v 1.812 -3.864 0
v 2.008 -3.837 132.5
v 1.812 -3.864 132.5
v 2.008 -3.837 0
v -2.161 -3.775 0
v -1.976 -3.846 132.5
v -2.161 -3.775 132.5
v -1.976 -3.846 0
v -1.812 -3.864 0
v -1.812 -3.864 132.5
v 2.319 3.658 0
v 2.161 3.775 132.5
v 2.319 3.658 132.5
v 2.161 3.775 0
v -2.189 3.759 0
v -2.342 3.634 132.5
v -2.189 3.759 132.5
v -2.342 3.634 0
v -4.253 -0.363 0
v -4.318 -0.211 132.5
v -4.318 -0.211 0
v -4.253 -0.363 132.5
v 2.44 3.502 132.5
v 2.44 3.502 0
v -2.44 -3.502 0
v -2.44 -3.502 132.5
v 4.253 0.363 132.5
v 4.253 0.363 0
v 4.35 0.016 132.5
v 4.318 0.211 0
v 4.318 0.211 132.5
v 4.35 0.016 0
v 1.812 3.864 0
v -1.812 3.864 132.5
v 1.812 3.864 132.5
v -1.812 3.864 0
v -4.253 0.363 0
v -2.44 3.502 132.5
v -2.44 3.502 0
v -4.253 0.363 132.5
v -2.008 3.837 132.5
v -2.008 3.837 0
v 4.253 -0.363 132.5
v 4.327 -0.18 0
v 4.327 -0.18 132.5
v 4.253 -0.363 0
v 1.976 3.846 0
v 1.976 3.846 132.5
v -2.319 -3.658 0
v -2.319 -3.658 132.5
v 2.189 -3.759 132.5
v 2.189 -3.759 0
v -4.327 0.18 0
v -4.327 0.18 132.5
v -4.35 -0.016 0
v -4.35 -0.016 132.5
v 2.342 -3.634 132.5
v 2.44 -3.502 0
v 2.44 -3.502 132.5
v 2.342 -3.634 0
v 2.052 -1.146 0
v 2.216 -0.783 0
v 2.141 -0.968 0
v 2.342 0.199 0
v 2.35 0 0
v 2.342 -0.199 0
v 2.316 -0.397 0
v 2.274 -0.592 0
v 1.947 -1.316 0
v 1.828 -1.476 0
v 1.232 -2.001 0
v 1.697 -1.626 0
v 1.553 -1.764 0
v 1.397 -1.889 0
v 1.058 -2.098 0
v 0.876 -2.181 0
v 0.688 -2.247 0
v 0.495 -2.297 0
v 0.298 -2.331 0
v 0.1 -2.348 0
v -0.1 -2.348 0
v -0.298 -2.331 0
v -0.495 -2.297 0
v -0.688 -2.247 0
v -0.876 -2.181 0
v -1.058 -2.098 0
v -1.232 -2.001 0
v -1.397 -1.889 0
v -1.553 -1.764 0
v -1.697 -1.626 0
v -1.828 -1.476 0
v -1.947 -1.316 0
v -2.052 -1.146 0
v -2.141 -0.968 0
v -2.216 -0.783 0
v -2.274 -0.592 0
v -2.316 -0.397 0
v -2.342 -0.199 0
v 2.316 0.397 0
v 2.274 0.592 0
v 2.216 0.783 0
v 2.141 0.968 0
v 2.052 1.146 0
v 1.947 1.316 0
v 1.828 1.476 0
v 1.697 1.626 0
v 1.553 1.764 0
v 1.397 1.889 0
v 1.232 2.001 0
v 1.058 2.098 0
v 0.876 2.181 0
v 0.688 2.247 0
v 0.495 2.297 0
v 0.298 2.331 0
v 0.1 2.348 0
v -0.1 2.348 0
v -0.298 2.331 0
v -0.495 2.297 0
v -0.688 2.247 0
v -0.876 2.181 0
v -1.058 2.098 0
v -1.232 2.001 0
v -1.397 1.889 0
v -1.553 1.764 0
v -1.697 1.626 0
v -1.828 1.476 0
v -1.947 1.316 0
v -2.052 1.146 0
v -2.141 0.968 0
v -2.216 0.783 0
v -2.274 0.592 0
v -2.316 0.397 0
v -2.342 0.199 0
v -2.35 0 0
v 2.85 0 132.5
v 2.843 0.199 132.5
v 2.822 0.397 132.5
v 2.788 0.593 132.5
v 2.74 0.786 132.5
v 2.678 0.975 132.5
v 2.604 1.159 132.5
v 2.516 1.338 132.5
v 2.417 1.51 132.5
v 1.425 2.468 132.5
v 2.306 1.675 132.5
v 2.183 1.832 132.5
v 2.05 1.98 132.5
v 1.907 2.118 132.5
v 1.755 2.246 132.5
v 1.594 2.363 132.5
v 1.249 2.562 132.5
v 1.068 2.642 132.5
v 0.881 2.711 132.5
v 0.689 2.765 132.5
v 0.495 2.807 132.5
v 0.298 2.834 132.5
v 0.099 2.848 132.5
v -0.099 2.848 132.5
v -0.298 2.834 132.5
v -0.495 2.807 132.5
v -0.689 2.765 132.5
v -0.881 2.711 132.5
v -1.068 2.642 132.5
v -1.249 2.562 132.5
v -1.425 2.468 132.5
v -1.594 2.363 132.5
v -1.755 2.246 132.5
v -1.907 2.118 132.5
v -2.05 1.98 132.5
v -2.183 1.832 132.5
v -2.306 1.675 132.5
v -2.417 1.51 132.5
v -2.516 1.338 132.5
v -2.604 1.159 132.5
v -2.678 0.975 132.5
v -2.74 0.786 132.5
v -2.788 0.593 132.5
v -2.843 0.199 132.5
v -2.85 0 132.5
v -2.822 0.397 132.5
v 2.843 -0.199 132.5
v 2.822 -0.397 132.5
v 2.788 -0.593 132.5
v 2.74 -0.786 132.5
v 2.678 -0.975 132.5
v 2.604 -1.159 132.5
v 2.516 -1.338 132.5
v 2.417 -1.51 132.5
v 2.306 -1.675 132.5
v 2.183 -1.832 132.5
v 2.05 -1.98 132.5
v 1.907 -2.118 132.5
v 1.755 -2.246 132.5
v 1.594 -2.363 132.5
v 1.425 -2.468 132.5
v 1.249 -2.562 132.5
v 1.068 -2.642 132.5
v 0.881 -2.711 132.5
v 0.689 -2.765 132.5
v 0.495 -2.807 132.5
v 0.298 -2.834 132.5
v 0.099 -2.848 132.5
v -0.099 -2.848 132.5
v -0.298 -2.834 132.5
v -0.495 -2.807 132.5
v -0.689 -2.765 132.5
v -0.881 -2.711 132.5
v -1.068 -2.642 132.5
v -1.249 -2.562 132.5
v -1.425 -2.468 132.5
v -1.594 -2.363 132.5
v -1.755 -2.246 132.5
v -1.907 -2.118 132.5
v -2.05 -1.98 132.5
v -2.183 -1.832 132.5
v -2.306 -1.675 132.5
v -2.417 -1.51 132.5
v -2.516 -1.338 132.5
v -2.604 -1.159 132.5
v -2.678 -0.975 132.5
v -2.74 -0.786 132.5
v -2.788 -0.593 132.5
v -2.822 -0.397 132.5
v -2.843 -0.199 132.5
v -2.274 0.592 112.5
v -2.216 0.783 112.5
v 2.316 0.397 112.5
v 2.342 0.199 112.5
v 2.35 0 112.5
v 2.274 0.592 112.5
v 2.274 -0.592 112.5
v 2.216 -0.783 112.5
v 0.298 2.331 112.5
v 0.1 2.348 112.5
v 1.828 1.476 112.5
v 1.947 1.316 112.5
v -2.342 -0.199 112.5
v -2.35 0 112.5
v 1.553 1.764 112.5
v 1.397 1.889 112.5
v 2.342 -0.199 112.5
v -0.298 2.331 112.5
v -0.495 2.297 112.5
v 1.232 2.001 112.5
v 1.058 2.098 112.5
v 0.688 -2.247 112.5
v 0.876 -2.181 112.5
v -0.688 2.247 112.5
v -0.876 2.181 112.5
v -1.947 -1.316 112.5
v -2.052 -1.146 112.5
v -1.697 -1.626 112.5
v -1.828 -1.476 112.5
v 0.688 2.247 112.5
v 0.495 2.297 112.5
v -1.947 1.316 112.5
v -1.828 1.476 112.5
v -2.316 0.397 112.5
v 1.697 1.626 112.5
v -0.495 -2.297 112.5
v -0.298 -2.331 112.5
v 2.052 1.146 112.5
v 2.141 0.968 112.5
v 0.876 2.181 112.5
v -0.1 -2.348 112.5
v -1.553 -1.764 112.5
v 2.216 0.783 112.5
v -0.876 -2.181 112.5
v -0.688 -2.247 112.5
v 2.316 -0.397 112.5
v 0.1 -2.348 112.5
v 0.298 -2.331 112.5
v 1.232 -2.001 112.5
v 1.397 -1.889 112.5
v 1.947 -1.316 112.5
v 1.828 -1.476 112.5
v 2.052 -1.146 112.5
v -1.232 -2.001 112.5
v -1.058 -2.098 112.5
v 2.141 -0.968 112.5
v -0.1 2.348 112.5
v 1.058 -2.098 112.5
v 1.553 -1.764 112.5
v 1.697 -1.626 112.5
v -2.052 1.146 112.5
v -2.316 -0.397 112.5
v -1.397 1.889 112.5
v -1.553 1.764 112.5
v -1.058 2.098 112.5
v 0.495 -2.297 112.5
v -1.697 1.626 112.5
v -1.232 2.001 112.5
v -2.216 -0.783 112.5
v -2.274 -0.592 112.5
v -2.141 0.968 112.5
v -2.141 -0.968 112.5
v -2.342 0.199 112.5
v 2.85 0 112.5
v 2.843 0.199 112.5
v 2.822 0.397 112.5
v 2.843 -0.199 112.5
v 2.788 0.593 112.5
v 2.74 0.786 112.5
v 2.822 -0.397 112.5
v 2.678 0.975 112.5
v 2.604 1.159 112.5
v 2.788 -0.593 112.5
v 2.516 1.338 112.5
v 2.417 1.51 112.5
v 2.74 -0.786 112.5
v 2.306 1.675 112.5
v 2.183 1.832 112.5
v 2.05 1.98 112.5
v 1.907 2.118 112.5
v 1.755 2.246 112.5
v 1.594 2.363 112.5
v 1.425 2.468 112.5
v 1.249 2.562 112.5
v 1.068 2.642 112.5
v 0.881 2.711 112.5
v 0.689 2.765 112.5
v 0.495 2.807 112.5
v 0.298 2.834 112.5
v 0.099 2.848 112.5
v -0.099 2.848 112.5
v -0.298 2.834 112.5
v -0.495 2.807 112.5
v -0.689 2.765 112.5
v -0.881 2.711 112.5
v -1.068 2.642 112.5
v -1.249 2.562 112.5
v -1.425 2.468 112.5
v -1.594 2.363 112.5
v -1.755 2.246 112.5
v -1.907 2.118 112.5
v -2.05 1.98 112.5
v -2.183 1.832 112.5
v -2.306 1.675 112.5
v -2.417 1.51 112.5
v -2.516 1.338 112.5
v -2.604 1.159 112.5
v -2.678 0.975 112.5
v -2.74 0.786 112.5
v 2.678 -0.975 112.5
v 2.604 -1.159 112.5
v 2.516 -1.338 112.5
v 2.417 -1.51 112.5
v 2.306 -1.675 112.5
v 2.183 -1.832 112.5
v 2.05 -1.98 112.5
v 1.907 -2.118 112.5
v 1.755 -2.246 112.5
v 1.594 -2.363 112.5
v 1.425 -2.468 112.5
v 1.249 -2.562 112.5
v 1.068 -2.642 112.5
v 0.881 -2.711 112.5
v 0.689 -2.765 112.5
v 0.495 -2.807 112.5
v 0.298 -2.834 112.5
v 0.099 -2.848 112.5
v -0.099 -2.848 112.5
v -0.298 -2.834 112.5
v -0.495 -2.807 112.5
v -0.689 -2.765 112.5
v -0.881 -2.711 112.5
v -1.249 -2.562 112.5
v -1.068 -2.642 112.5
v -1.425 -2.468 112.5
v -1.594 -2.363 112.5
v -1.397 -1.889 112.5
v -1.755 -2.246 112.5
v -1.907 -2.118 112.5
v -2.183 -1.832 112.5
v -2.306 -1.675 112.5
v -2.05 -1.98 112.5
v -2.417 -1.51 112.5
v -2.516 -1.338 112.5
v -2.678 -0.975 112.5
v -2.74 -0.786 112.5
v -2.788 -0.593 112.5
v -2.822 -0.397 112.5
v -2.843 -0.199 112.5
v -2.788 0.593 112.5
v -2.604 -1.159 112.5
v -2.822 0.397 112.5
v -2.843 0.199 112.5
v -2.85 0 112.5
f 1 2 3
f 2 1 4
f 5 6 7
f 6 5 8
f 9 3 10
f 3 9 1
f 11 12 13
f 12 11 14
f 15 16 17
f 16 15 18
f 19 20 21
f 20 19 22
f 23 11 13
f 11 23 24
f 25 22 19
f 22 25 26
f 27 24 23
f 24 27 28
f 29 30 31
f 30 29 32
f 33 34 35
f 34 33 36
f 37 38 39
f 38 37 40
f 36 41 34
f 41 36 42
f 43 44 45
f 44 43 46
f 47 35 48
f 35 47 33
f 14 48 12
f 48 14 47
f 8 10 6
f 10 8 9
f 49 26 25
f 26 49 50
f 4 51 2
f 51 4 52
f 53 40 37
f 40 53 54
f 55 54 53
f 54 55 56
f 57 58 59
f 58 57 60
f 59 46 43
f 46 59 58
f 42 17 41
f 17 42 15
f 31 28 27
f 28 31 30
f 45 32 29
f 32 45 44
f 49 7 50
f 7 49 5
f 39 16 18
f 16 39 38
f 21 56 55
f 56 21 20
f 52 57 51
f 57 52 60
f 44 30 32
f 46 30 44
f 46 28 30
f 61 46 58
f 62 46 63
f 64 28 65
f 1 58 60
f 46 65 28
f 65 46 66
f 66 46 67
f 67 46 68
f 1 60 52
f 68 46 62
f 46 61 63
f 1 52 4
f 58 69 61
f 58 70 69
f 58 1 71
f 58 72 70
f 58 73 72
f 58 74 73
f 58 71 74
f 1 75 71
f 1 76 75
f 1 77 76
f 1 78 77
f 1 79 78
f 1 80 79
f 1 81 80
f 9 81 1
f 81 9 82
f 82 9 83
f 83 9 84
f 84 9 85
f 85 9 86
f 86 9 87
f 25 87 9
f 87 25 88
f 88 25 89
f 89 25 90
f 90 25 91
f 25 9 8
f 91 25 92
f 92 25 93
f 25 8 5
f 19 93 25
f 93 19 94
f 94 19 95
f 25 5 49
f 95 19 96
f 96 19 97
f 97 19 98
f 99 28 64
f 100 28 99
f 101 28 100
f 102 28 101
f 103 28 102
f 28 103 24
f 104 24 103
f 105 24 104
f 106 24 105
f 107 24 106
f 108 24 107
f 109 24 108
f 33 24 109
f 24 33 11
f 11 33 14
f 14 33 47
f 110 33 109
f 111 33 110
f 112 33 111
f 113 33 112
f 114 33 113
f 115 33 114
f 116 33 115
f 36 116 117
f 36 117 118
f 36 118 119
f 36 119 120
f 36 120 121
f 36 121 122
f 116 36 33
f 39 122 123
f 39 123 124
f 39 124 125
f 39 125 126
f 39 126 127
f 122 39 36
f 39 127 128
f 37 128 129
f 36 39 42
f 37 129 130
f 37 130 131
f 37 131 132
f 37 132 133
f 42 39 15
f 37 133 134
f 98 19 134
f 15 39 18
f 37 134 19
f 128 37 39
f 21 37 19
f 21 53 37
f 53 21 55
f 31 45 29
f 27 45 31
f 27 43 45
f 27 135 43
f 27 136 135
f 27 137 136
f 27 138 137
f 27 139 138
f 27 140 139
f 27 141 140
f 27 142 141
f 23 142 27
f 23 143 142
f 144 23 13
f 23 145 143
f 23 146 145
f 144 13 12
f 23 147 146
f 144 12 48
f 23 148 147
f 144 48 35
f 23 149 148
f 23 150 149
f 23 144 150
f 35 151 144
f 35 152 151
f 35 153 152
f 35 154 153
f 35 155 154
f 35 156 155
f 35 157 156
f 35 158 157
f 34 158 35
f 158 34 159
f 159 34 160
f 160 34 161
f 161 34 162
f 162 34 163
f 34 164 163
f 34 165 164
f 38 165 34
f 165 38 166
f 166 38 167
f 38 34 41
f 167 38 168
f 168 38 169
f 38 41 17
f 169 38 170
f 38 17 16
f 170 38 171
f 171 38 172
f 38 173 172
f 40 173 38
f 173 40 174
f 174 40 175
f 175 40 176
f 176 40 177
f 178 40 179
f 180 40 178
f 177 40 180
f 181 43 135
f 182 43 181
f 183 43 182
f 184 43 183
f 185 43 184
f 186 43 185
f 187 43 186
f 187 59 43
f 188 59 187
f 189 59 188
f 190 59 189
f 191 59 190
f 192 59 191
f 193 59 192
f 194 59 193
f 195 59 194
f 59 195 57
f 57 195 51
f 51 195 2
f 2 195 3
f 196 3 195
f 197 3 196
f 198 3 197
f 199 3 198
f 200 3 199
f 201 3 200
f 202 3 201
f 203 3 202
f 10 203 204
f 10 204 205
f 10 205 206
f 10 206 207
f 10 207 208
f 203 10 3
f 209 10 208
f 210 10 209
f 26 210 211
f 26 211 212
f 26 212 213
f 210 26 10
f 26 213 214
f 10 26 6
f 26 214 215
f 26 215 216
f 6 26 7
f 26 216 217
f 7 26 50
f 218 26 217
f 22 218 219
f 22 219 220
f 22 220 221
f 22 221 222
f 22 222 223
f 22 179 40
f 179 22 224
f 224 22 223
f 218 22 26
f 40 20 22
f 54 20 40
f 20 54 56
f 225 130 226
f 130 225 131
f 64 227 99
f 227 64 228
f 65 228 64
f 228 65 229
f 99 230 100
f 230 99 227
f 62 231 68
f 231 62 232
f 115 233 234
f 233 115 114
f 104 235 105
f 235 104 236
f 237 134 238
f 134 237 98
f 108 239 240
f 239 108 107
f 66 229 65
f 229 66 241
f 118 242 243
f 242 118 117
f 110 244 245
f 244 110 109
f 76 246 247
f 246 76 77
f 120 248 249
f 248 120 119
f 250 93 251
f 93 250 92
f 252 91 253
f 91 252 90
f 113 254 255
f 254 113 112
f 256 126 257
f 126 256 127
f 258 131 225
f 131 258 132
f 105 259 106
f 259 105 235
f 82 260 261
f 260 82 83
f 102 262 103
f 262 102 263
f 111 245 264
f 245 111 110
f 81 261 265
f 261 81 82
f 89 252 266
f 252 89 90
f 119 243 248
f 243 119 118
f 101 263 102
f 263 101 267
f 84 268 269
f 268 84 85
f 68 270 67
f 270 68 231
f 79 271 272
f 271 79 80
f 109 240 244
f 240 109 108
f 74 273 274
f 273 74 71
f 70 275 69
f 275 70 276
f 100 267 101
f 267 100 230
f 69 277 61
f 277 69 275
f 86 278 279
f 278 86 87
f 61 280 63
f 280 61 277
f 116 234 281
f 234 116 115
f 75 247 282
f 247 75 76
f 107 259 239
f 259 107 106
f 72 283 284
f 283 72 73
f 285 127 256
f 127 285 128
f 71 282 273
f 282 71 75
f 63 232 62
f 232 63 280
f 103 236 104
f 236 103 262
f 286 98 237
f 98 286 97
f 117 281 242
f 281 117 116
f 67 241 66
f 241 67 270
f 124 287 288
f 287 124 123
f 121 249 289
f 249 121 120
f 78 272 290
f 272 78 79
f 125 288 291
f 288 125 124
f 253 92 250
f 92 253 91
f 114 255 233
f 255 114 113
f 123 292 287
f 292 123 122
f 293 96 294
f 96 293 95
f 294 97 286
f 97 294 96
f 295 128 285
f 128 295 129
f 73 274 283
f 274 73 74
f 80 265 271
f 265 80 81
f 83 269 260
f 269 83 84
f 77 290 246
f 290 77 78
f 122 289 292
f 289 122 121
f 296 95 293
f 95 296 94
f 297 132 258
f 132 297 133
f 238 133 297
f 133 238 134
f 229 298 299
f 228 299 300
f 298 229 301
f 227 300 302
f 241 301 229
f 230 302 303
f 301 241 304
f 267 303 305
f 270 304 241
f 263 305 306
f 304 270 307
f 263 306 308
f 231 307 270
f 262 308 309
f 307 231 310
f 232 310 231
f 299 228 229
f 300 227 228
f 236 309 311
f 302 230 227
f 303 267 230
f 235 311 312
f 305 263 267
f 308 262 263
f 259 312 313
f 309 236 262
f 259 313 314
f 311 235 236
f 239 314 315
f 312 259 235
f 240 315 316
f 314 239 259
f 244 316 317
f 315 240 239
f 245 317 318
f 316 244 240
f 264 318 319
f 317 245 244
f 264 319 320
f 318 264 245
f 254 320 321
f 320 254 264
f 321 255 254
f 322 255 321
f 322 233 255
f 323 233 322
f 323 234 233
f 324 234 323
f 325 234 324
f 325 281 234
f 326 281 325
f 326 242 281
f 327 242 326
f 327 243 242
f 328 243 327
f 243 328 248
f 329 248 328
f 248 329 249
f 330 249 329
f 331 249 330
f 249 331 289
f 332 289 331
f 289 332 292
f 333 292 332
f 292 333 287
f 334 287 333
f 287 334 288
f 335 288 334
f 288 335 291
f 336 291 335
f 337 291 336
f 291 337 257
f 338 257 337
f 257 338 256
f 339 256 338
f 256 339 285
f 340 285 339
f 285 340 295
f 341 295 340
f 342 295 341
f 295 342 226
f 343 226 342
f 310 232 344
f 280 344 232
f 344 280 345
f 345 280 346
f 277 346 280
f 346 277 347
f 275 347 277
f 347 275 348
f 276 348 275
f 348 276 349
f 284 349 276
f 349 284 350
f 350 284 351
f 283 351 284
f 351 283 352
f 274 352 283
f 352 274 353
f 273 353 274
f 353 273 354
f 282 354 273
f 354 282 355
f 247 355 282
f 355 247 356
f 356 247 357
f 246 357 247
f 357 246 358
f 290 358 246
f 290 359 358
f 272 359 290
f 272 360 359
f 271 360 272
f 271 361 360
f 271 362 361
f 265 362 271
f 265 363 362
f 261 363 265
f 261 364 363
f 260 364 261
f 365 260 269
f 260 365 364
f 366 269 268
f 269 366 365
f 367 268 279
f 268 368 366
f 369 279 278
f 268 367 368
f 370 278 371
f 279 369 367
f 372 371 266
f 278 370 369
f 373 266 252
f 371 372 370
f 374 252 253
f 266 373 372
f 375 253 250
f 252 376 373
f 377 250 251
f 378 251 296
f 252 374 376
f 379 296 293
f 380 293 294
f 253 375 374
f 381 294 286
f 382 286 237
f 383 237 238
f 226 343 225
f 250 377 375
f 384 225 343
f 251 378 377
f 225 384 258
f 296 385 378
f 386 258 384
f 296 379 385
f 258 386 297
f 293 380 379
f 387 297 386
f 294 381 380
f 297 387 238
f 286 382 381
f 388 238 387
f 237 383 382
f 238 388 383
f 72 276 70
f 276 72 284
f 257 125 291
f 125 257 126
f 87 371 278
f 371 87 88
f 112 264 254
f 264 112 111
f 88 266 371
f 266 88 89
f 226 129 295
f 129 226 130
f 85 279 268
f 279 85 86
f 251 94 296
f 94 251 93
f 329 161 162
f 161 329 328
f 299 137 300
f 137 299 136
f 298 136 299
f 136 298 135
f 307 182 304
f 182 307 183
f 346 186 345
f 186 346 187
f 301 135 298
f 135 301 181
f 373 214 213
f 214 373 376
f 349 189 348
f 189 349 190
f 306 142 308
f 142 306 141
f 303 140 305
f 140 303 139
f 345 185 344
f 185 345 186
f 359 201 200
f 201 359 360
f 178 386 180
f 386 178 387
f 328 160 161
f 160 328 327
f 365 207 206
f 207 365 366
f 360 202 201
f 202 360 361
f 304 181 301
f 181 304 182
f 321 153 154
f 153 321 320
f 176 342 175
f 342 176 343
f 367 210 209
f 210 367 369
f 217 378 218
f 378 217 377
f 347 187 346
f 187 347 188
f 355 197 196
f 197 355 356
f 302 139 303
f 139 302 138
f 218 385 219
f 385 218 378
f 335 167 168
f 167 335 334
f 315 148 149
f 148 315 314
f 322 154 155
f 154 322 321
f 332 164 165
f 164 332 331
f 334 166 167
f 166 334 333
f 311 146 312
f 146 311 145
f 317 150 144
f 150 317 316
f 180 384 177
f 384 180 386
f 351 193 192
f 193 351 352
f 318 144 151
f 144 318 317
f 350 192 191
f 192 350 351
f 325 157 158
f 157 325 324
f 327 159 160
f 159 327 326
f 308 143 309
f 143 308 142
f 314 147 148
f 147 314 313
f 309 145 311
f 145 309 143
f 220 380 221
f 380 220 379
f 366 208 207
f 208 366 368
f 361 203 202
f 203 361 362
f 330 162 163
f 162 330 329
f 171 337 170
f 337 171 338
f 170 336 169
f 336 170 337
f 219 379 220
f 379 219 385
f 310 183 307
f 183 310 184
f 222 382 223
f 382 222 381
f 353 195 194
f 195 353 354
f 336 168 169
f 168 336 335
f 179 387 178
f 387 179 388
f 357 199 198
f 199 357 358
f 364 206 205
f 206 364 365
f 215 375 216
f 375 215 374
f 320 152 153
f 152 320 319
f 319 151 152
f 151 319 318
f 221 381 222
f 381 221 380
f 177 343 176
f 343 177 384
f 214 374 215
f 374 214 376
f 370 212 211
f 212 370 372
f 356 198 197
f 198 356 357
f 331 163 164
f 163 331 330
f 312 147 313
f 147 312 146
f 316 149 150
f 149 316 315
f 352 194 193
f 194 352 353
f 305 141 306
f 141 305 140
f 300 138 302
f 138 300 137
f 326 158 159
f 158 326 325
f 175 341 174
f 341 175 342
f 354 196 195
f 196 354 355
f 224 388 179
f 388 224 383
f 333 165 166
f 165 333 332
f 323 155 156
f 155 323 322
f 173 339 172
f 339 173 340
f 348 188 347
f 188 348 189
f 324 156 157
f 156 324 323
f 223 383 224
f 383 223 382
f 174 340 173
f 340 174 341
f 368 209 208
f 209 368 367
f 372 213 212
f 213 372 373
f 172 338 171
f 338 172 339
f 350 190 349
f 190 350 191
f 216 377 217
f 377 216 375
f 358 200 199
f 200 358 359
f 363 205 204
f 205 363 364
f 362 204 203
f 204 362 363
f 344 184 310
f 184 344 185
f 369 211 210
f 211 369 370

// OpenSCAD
/*
 * kitaboshi.scad generates barrel for the Kita-Boshi 2mm mechanical pencil
 * GNU General Public License v3.0
 * Permissions of this strong copyleft license are conditioned on making available complete source
 * code of licensed works and modifications, which include larger works using a licensed work, under
 * the same license. Copyright and license notices must be preserved. Contributors provide an express
 * grant of patent rights.
 */

// Pen shape
cylindric = "N"; // [N:No, Y:Yes]
// Pen grip
grip = "N"; // [N:No, Y:Yes]

// Printer tolerance
printer_tolerance = 0.2;
// Printer nozzle diameter
nozzle_width = 0.4;
// Printer layer height
layer_height = 0.2;

/* [Hidden] */
// Main barrel dimensions
barrel_length = 132.5;
barrel_diameter = 8.7;
lead_chamber_diameter = 4.5;
thread_diameter = 5.5;
thread_length = 20.0;

// Resolution
$fa=2; // default minimum facet angle
$fs=0.2; // default minimum facet size

module kitaboshi( cy = cylindric,
                  gr = grip,
                  pt = printer_tolerance,
                  nw = nozzle_width,
                  lh = layer_height) {

     // Barrel
     module barrel() {
          sides = ((cy == "Y") || (cy == "YES")) ? 180 : 6;
          difference() {

               // External shape
               linear_extrude(height = barrel_length, center = false, convexity = 10, twist = 0)
                    offset(r = (barrel_diameter/sides)/2)
                    circle(d = barrel_diameter-(barrel_diameter/sides), $fn = sides);

               // Lead hole
               cylinder(h = barrel_length-thread_length, d = lead_chamber_diameter+pt);

               // Thread hole
               translate([0, 0, barrel_length-thread_length])
                    cylinder(h = thread_length, d = thread_diameter+pt);
          }
     }

     // Grip substractive pattern
     module grip() {
          translate([0, 0, 2*barrel_length/3])
               for (i = [0 : barrel_diameter-barrel_diameter*sqrt(3)/2 : barrel_length/4])
                    translate([0, 0, i])
                         rotate_extrude(angle = 360, convexity = 2)
                         translate([barrel_diameter/2, 0, 0])
                         rotate([0, 0, 30])
                         circle(d = (barrel_diameter/2)-barrel_diameter*sqrt(3)/4, $fn = 6);
     }

     // Main
     difference() {
          color("Goldenrod", 1) barrel();
          if ((gr == "Y") || (gr == "YES")) {
               color("YellowGreen", 1) grip();
          }
     }
}

// Customizer instantiation
kitaboshi();
